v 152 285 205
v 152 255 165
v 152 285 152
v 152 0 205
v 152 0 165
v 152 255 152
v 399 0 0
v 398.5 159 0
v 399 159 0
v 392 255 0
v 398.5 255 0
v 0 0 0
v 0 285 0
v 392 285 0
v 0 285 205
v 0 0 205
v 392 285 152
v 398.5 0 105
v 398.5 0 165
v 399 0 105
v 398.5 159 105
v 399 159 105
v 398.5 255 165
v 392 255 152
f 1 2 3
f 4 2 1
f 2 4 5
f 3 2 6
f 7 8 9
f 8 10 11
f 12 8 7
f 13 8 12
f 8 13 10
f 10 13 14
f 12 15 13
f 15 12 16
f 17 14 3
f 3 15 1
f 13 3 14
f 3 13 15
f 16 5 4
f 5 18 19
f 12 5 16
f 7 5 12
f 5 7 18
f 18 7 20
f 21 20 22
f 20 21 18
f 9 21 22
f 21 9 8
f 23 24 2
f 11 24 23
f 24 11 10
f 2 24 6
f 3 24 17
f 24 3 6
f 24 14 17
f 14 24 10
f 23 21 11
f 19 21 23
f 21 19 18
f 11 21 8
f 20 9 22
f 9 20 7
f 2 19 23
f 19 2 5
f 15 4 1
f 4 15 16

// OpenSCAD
module box() { cube([400,285,240]); };

// Nothing to print
charX = 152;
charY = 285;
charZ = 122;
echo(str("character boxes x:",charX," y:",charY," z:",charZ));
module characters() { cube([charX,charY,charZ]); };

// Done
monsX = 228-3;
monsY = 162-3;
monsZ = 25+21+21+21+17;
echo(str("monster boxes x:",monsX," y:",monsY," z:",monsZ));
module monsterBoxes() { cube([monsX,monsY,monsZ]); };

// Done
largeCX = 207;
largeCZ = 105;
largeCY = 94 + 2;
echo(str("large card box x:",largeCX," y:",largeCY," z:",largeCZ));
module largeCardBox() { cube([largeCX,largeCY,largeCZ]); };

// Done
playerX = 152;
playerY = 120;
playerZ =  28 + 2;
echo(str("player boxes x:",playerX," y:",playerY," z:",playerZ));
module playerBox() { cube([playerX,playerY,playerZ]); };

// Done
statsX = 106+4;
statsY = 102.5 +4;
statsZ = 53;
echo(str("stats box x:",statsX," y:",statsY," z:",statsZ));
module statsBox() { cube([statsX,statsY,statsZ]); };

// Done
smallCX = charX;
smallCY = charY - statsY;
smallCZ = statsZ;
echo(str("small cards x:",smallCX," y:",smallCY," z:",smallCZ));
module smallCardsBox() { cube([smallCX,smallCY,smallCZ]); };

// Done
damageX = smallCX - statsX;
damageY = statsY;
damageZ = statsZ;
echo(str("damage  box x:",damageX," y:",damageY," z:",damageZ));
module damageTokensBox() { cube([damageX,damageY,damageZ]); };

// Done
obsY = 156+6; // current size, can it shrink by 6?
obsX = 143;
obsZ = 60;
echo(str("obstacle box x:",obsX," y:",obsY," z:",obsZ));
module obstacleBox() { cube([obsX,obsY,obsZ]); };

// Done
miniX =  216;
miniY = 93;
miniZ = 60;
echo(str("minis box x:",miniX," y:",miniY," z:",miniZ));
module miniBox() { cube([miniX,miniY,miniZ]); };

// Done
bossX = 39.5;
bossY = largeCY;
bossZ = largeCZ;
echo(str("boss box x:",bossX," y:",bossY," z:",bossZ));
module bossBox() { cube([bossX,bossY,bossZ]); };

// 
envX = 78+4-0.5;
envY = 158 + 4;
envZ = 50+2-6;
echo(str("envelope box x:",envX," y:",envY," z:",envZ));
module envelopeBox() { cube([envX,envY,envZ]); };

// Done
statusZ = monsZ;
statusY = monsY;
statusX = 22;
echo(str("status box x:",statusX," y:",statusY," z:",statusZ));
module statusBox() { cube([statusX,statusY,statusZ]); };

// Done
battleZ = 14;
battleY = envY; //(50*3)+4+2;
battleX = envX; //72 + 4;
echo(str("battle box x:",battleX," y:",battleY," z:",battleZ));
module battleBox() { cube([battleX,battleY,battleZ]); };

// Done
lootX = 22;
lootZ = envZ+battleZ;
lootY = envY;
echo(str("loot box x:",lootX," y:",lootY," z:",lootZ));
module lootBox() { cube([lootX,lootY,lootZ]); };

// Done
modX = 400 - charX - miniX-1.5;
modZ = miniZ;
modY = miniY;
echo(str("mod box x:",modX," y:",modY," z:",modZ));
module modBox() { cube([modX,modY,modZ]); };

// 
standsX = playerX;
standsY = 285 - (2 * playerY);
standsZ = playerZ;
echo(str("stands box x:",standsX," y:",standsY," z:",standsZ));
module standsBox() { cube([standsX,standsY,standsZ]); };

layer1 = true;
layer2 = true;
layer3 = true;

//color("red",0.10) box();

if (layer1) {
    color("white") characters();
    translate([charX,0,0]) color("grey") monsterBoxes();
    //translate([charX+monsX,0,0]) color("beige") monsterStats();
    // This is on its side
    translate([charX,monsY,0]) color("blue") largeCardBox();
    translate([charX+playerY,monsY+largeCY+playerZ,0]) rotate([90,-90,0]) color("purple") playerBox();
    translate([charX+(2*playerY),monsY+largeCY+playerZ,0]) rotate([90,-90,0]) color("LimeGreen") playerBox();
    translate([charX+largeCX,monsY,0]) color("Black") bossBox();
    translate([charX+monsX,0,0]) color("Chocolate") statusBox();
}  
if (layer2) {  
    translate([0,charY-statsY,charZ]) color("orange") statsBox();
    translate([0,0,charZ]) color("Magenta") smallCardsBox();
    translate([statsX,smallCY,charZ]) color("red") damageTokensBox();
    rotate([0,0,0]) translate([charX,0,monsZ]) color("LightSalmon") obstacleBox();
    translate([charX,obsY,largeCZ]) color("Gold") miniBox();
    translate([charX+obsX,0,monsZ]) color("Aqua") envelopeBox();
    translate([charX+miniX,envY,monsZ]) color("SeaGreen") modBox();
    translate([charX+obsX+envX,0,monsZ]) color("CornflowerBlue") lootBox();
}
if (layer3) {
     translate([0,0,charZ+smallCZ]) rotate([0,0,0]) color("Coral") playerBox();
     translate([0,playerY,charZ+smallCZ]) rotate([0,0,0]) color("Teal") playerBox();
     translate([charX+obsX,0,monsZ+envZ]) color("YellowGreen") battleBox();
     translate([0,2*playerY,charZ+statsZ]) color("Silver") standsBox();
}
